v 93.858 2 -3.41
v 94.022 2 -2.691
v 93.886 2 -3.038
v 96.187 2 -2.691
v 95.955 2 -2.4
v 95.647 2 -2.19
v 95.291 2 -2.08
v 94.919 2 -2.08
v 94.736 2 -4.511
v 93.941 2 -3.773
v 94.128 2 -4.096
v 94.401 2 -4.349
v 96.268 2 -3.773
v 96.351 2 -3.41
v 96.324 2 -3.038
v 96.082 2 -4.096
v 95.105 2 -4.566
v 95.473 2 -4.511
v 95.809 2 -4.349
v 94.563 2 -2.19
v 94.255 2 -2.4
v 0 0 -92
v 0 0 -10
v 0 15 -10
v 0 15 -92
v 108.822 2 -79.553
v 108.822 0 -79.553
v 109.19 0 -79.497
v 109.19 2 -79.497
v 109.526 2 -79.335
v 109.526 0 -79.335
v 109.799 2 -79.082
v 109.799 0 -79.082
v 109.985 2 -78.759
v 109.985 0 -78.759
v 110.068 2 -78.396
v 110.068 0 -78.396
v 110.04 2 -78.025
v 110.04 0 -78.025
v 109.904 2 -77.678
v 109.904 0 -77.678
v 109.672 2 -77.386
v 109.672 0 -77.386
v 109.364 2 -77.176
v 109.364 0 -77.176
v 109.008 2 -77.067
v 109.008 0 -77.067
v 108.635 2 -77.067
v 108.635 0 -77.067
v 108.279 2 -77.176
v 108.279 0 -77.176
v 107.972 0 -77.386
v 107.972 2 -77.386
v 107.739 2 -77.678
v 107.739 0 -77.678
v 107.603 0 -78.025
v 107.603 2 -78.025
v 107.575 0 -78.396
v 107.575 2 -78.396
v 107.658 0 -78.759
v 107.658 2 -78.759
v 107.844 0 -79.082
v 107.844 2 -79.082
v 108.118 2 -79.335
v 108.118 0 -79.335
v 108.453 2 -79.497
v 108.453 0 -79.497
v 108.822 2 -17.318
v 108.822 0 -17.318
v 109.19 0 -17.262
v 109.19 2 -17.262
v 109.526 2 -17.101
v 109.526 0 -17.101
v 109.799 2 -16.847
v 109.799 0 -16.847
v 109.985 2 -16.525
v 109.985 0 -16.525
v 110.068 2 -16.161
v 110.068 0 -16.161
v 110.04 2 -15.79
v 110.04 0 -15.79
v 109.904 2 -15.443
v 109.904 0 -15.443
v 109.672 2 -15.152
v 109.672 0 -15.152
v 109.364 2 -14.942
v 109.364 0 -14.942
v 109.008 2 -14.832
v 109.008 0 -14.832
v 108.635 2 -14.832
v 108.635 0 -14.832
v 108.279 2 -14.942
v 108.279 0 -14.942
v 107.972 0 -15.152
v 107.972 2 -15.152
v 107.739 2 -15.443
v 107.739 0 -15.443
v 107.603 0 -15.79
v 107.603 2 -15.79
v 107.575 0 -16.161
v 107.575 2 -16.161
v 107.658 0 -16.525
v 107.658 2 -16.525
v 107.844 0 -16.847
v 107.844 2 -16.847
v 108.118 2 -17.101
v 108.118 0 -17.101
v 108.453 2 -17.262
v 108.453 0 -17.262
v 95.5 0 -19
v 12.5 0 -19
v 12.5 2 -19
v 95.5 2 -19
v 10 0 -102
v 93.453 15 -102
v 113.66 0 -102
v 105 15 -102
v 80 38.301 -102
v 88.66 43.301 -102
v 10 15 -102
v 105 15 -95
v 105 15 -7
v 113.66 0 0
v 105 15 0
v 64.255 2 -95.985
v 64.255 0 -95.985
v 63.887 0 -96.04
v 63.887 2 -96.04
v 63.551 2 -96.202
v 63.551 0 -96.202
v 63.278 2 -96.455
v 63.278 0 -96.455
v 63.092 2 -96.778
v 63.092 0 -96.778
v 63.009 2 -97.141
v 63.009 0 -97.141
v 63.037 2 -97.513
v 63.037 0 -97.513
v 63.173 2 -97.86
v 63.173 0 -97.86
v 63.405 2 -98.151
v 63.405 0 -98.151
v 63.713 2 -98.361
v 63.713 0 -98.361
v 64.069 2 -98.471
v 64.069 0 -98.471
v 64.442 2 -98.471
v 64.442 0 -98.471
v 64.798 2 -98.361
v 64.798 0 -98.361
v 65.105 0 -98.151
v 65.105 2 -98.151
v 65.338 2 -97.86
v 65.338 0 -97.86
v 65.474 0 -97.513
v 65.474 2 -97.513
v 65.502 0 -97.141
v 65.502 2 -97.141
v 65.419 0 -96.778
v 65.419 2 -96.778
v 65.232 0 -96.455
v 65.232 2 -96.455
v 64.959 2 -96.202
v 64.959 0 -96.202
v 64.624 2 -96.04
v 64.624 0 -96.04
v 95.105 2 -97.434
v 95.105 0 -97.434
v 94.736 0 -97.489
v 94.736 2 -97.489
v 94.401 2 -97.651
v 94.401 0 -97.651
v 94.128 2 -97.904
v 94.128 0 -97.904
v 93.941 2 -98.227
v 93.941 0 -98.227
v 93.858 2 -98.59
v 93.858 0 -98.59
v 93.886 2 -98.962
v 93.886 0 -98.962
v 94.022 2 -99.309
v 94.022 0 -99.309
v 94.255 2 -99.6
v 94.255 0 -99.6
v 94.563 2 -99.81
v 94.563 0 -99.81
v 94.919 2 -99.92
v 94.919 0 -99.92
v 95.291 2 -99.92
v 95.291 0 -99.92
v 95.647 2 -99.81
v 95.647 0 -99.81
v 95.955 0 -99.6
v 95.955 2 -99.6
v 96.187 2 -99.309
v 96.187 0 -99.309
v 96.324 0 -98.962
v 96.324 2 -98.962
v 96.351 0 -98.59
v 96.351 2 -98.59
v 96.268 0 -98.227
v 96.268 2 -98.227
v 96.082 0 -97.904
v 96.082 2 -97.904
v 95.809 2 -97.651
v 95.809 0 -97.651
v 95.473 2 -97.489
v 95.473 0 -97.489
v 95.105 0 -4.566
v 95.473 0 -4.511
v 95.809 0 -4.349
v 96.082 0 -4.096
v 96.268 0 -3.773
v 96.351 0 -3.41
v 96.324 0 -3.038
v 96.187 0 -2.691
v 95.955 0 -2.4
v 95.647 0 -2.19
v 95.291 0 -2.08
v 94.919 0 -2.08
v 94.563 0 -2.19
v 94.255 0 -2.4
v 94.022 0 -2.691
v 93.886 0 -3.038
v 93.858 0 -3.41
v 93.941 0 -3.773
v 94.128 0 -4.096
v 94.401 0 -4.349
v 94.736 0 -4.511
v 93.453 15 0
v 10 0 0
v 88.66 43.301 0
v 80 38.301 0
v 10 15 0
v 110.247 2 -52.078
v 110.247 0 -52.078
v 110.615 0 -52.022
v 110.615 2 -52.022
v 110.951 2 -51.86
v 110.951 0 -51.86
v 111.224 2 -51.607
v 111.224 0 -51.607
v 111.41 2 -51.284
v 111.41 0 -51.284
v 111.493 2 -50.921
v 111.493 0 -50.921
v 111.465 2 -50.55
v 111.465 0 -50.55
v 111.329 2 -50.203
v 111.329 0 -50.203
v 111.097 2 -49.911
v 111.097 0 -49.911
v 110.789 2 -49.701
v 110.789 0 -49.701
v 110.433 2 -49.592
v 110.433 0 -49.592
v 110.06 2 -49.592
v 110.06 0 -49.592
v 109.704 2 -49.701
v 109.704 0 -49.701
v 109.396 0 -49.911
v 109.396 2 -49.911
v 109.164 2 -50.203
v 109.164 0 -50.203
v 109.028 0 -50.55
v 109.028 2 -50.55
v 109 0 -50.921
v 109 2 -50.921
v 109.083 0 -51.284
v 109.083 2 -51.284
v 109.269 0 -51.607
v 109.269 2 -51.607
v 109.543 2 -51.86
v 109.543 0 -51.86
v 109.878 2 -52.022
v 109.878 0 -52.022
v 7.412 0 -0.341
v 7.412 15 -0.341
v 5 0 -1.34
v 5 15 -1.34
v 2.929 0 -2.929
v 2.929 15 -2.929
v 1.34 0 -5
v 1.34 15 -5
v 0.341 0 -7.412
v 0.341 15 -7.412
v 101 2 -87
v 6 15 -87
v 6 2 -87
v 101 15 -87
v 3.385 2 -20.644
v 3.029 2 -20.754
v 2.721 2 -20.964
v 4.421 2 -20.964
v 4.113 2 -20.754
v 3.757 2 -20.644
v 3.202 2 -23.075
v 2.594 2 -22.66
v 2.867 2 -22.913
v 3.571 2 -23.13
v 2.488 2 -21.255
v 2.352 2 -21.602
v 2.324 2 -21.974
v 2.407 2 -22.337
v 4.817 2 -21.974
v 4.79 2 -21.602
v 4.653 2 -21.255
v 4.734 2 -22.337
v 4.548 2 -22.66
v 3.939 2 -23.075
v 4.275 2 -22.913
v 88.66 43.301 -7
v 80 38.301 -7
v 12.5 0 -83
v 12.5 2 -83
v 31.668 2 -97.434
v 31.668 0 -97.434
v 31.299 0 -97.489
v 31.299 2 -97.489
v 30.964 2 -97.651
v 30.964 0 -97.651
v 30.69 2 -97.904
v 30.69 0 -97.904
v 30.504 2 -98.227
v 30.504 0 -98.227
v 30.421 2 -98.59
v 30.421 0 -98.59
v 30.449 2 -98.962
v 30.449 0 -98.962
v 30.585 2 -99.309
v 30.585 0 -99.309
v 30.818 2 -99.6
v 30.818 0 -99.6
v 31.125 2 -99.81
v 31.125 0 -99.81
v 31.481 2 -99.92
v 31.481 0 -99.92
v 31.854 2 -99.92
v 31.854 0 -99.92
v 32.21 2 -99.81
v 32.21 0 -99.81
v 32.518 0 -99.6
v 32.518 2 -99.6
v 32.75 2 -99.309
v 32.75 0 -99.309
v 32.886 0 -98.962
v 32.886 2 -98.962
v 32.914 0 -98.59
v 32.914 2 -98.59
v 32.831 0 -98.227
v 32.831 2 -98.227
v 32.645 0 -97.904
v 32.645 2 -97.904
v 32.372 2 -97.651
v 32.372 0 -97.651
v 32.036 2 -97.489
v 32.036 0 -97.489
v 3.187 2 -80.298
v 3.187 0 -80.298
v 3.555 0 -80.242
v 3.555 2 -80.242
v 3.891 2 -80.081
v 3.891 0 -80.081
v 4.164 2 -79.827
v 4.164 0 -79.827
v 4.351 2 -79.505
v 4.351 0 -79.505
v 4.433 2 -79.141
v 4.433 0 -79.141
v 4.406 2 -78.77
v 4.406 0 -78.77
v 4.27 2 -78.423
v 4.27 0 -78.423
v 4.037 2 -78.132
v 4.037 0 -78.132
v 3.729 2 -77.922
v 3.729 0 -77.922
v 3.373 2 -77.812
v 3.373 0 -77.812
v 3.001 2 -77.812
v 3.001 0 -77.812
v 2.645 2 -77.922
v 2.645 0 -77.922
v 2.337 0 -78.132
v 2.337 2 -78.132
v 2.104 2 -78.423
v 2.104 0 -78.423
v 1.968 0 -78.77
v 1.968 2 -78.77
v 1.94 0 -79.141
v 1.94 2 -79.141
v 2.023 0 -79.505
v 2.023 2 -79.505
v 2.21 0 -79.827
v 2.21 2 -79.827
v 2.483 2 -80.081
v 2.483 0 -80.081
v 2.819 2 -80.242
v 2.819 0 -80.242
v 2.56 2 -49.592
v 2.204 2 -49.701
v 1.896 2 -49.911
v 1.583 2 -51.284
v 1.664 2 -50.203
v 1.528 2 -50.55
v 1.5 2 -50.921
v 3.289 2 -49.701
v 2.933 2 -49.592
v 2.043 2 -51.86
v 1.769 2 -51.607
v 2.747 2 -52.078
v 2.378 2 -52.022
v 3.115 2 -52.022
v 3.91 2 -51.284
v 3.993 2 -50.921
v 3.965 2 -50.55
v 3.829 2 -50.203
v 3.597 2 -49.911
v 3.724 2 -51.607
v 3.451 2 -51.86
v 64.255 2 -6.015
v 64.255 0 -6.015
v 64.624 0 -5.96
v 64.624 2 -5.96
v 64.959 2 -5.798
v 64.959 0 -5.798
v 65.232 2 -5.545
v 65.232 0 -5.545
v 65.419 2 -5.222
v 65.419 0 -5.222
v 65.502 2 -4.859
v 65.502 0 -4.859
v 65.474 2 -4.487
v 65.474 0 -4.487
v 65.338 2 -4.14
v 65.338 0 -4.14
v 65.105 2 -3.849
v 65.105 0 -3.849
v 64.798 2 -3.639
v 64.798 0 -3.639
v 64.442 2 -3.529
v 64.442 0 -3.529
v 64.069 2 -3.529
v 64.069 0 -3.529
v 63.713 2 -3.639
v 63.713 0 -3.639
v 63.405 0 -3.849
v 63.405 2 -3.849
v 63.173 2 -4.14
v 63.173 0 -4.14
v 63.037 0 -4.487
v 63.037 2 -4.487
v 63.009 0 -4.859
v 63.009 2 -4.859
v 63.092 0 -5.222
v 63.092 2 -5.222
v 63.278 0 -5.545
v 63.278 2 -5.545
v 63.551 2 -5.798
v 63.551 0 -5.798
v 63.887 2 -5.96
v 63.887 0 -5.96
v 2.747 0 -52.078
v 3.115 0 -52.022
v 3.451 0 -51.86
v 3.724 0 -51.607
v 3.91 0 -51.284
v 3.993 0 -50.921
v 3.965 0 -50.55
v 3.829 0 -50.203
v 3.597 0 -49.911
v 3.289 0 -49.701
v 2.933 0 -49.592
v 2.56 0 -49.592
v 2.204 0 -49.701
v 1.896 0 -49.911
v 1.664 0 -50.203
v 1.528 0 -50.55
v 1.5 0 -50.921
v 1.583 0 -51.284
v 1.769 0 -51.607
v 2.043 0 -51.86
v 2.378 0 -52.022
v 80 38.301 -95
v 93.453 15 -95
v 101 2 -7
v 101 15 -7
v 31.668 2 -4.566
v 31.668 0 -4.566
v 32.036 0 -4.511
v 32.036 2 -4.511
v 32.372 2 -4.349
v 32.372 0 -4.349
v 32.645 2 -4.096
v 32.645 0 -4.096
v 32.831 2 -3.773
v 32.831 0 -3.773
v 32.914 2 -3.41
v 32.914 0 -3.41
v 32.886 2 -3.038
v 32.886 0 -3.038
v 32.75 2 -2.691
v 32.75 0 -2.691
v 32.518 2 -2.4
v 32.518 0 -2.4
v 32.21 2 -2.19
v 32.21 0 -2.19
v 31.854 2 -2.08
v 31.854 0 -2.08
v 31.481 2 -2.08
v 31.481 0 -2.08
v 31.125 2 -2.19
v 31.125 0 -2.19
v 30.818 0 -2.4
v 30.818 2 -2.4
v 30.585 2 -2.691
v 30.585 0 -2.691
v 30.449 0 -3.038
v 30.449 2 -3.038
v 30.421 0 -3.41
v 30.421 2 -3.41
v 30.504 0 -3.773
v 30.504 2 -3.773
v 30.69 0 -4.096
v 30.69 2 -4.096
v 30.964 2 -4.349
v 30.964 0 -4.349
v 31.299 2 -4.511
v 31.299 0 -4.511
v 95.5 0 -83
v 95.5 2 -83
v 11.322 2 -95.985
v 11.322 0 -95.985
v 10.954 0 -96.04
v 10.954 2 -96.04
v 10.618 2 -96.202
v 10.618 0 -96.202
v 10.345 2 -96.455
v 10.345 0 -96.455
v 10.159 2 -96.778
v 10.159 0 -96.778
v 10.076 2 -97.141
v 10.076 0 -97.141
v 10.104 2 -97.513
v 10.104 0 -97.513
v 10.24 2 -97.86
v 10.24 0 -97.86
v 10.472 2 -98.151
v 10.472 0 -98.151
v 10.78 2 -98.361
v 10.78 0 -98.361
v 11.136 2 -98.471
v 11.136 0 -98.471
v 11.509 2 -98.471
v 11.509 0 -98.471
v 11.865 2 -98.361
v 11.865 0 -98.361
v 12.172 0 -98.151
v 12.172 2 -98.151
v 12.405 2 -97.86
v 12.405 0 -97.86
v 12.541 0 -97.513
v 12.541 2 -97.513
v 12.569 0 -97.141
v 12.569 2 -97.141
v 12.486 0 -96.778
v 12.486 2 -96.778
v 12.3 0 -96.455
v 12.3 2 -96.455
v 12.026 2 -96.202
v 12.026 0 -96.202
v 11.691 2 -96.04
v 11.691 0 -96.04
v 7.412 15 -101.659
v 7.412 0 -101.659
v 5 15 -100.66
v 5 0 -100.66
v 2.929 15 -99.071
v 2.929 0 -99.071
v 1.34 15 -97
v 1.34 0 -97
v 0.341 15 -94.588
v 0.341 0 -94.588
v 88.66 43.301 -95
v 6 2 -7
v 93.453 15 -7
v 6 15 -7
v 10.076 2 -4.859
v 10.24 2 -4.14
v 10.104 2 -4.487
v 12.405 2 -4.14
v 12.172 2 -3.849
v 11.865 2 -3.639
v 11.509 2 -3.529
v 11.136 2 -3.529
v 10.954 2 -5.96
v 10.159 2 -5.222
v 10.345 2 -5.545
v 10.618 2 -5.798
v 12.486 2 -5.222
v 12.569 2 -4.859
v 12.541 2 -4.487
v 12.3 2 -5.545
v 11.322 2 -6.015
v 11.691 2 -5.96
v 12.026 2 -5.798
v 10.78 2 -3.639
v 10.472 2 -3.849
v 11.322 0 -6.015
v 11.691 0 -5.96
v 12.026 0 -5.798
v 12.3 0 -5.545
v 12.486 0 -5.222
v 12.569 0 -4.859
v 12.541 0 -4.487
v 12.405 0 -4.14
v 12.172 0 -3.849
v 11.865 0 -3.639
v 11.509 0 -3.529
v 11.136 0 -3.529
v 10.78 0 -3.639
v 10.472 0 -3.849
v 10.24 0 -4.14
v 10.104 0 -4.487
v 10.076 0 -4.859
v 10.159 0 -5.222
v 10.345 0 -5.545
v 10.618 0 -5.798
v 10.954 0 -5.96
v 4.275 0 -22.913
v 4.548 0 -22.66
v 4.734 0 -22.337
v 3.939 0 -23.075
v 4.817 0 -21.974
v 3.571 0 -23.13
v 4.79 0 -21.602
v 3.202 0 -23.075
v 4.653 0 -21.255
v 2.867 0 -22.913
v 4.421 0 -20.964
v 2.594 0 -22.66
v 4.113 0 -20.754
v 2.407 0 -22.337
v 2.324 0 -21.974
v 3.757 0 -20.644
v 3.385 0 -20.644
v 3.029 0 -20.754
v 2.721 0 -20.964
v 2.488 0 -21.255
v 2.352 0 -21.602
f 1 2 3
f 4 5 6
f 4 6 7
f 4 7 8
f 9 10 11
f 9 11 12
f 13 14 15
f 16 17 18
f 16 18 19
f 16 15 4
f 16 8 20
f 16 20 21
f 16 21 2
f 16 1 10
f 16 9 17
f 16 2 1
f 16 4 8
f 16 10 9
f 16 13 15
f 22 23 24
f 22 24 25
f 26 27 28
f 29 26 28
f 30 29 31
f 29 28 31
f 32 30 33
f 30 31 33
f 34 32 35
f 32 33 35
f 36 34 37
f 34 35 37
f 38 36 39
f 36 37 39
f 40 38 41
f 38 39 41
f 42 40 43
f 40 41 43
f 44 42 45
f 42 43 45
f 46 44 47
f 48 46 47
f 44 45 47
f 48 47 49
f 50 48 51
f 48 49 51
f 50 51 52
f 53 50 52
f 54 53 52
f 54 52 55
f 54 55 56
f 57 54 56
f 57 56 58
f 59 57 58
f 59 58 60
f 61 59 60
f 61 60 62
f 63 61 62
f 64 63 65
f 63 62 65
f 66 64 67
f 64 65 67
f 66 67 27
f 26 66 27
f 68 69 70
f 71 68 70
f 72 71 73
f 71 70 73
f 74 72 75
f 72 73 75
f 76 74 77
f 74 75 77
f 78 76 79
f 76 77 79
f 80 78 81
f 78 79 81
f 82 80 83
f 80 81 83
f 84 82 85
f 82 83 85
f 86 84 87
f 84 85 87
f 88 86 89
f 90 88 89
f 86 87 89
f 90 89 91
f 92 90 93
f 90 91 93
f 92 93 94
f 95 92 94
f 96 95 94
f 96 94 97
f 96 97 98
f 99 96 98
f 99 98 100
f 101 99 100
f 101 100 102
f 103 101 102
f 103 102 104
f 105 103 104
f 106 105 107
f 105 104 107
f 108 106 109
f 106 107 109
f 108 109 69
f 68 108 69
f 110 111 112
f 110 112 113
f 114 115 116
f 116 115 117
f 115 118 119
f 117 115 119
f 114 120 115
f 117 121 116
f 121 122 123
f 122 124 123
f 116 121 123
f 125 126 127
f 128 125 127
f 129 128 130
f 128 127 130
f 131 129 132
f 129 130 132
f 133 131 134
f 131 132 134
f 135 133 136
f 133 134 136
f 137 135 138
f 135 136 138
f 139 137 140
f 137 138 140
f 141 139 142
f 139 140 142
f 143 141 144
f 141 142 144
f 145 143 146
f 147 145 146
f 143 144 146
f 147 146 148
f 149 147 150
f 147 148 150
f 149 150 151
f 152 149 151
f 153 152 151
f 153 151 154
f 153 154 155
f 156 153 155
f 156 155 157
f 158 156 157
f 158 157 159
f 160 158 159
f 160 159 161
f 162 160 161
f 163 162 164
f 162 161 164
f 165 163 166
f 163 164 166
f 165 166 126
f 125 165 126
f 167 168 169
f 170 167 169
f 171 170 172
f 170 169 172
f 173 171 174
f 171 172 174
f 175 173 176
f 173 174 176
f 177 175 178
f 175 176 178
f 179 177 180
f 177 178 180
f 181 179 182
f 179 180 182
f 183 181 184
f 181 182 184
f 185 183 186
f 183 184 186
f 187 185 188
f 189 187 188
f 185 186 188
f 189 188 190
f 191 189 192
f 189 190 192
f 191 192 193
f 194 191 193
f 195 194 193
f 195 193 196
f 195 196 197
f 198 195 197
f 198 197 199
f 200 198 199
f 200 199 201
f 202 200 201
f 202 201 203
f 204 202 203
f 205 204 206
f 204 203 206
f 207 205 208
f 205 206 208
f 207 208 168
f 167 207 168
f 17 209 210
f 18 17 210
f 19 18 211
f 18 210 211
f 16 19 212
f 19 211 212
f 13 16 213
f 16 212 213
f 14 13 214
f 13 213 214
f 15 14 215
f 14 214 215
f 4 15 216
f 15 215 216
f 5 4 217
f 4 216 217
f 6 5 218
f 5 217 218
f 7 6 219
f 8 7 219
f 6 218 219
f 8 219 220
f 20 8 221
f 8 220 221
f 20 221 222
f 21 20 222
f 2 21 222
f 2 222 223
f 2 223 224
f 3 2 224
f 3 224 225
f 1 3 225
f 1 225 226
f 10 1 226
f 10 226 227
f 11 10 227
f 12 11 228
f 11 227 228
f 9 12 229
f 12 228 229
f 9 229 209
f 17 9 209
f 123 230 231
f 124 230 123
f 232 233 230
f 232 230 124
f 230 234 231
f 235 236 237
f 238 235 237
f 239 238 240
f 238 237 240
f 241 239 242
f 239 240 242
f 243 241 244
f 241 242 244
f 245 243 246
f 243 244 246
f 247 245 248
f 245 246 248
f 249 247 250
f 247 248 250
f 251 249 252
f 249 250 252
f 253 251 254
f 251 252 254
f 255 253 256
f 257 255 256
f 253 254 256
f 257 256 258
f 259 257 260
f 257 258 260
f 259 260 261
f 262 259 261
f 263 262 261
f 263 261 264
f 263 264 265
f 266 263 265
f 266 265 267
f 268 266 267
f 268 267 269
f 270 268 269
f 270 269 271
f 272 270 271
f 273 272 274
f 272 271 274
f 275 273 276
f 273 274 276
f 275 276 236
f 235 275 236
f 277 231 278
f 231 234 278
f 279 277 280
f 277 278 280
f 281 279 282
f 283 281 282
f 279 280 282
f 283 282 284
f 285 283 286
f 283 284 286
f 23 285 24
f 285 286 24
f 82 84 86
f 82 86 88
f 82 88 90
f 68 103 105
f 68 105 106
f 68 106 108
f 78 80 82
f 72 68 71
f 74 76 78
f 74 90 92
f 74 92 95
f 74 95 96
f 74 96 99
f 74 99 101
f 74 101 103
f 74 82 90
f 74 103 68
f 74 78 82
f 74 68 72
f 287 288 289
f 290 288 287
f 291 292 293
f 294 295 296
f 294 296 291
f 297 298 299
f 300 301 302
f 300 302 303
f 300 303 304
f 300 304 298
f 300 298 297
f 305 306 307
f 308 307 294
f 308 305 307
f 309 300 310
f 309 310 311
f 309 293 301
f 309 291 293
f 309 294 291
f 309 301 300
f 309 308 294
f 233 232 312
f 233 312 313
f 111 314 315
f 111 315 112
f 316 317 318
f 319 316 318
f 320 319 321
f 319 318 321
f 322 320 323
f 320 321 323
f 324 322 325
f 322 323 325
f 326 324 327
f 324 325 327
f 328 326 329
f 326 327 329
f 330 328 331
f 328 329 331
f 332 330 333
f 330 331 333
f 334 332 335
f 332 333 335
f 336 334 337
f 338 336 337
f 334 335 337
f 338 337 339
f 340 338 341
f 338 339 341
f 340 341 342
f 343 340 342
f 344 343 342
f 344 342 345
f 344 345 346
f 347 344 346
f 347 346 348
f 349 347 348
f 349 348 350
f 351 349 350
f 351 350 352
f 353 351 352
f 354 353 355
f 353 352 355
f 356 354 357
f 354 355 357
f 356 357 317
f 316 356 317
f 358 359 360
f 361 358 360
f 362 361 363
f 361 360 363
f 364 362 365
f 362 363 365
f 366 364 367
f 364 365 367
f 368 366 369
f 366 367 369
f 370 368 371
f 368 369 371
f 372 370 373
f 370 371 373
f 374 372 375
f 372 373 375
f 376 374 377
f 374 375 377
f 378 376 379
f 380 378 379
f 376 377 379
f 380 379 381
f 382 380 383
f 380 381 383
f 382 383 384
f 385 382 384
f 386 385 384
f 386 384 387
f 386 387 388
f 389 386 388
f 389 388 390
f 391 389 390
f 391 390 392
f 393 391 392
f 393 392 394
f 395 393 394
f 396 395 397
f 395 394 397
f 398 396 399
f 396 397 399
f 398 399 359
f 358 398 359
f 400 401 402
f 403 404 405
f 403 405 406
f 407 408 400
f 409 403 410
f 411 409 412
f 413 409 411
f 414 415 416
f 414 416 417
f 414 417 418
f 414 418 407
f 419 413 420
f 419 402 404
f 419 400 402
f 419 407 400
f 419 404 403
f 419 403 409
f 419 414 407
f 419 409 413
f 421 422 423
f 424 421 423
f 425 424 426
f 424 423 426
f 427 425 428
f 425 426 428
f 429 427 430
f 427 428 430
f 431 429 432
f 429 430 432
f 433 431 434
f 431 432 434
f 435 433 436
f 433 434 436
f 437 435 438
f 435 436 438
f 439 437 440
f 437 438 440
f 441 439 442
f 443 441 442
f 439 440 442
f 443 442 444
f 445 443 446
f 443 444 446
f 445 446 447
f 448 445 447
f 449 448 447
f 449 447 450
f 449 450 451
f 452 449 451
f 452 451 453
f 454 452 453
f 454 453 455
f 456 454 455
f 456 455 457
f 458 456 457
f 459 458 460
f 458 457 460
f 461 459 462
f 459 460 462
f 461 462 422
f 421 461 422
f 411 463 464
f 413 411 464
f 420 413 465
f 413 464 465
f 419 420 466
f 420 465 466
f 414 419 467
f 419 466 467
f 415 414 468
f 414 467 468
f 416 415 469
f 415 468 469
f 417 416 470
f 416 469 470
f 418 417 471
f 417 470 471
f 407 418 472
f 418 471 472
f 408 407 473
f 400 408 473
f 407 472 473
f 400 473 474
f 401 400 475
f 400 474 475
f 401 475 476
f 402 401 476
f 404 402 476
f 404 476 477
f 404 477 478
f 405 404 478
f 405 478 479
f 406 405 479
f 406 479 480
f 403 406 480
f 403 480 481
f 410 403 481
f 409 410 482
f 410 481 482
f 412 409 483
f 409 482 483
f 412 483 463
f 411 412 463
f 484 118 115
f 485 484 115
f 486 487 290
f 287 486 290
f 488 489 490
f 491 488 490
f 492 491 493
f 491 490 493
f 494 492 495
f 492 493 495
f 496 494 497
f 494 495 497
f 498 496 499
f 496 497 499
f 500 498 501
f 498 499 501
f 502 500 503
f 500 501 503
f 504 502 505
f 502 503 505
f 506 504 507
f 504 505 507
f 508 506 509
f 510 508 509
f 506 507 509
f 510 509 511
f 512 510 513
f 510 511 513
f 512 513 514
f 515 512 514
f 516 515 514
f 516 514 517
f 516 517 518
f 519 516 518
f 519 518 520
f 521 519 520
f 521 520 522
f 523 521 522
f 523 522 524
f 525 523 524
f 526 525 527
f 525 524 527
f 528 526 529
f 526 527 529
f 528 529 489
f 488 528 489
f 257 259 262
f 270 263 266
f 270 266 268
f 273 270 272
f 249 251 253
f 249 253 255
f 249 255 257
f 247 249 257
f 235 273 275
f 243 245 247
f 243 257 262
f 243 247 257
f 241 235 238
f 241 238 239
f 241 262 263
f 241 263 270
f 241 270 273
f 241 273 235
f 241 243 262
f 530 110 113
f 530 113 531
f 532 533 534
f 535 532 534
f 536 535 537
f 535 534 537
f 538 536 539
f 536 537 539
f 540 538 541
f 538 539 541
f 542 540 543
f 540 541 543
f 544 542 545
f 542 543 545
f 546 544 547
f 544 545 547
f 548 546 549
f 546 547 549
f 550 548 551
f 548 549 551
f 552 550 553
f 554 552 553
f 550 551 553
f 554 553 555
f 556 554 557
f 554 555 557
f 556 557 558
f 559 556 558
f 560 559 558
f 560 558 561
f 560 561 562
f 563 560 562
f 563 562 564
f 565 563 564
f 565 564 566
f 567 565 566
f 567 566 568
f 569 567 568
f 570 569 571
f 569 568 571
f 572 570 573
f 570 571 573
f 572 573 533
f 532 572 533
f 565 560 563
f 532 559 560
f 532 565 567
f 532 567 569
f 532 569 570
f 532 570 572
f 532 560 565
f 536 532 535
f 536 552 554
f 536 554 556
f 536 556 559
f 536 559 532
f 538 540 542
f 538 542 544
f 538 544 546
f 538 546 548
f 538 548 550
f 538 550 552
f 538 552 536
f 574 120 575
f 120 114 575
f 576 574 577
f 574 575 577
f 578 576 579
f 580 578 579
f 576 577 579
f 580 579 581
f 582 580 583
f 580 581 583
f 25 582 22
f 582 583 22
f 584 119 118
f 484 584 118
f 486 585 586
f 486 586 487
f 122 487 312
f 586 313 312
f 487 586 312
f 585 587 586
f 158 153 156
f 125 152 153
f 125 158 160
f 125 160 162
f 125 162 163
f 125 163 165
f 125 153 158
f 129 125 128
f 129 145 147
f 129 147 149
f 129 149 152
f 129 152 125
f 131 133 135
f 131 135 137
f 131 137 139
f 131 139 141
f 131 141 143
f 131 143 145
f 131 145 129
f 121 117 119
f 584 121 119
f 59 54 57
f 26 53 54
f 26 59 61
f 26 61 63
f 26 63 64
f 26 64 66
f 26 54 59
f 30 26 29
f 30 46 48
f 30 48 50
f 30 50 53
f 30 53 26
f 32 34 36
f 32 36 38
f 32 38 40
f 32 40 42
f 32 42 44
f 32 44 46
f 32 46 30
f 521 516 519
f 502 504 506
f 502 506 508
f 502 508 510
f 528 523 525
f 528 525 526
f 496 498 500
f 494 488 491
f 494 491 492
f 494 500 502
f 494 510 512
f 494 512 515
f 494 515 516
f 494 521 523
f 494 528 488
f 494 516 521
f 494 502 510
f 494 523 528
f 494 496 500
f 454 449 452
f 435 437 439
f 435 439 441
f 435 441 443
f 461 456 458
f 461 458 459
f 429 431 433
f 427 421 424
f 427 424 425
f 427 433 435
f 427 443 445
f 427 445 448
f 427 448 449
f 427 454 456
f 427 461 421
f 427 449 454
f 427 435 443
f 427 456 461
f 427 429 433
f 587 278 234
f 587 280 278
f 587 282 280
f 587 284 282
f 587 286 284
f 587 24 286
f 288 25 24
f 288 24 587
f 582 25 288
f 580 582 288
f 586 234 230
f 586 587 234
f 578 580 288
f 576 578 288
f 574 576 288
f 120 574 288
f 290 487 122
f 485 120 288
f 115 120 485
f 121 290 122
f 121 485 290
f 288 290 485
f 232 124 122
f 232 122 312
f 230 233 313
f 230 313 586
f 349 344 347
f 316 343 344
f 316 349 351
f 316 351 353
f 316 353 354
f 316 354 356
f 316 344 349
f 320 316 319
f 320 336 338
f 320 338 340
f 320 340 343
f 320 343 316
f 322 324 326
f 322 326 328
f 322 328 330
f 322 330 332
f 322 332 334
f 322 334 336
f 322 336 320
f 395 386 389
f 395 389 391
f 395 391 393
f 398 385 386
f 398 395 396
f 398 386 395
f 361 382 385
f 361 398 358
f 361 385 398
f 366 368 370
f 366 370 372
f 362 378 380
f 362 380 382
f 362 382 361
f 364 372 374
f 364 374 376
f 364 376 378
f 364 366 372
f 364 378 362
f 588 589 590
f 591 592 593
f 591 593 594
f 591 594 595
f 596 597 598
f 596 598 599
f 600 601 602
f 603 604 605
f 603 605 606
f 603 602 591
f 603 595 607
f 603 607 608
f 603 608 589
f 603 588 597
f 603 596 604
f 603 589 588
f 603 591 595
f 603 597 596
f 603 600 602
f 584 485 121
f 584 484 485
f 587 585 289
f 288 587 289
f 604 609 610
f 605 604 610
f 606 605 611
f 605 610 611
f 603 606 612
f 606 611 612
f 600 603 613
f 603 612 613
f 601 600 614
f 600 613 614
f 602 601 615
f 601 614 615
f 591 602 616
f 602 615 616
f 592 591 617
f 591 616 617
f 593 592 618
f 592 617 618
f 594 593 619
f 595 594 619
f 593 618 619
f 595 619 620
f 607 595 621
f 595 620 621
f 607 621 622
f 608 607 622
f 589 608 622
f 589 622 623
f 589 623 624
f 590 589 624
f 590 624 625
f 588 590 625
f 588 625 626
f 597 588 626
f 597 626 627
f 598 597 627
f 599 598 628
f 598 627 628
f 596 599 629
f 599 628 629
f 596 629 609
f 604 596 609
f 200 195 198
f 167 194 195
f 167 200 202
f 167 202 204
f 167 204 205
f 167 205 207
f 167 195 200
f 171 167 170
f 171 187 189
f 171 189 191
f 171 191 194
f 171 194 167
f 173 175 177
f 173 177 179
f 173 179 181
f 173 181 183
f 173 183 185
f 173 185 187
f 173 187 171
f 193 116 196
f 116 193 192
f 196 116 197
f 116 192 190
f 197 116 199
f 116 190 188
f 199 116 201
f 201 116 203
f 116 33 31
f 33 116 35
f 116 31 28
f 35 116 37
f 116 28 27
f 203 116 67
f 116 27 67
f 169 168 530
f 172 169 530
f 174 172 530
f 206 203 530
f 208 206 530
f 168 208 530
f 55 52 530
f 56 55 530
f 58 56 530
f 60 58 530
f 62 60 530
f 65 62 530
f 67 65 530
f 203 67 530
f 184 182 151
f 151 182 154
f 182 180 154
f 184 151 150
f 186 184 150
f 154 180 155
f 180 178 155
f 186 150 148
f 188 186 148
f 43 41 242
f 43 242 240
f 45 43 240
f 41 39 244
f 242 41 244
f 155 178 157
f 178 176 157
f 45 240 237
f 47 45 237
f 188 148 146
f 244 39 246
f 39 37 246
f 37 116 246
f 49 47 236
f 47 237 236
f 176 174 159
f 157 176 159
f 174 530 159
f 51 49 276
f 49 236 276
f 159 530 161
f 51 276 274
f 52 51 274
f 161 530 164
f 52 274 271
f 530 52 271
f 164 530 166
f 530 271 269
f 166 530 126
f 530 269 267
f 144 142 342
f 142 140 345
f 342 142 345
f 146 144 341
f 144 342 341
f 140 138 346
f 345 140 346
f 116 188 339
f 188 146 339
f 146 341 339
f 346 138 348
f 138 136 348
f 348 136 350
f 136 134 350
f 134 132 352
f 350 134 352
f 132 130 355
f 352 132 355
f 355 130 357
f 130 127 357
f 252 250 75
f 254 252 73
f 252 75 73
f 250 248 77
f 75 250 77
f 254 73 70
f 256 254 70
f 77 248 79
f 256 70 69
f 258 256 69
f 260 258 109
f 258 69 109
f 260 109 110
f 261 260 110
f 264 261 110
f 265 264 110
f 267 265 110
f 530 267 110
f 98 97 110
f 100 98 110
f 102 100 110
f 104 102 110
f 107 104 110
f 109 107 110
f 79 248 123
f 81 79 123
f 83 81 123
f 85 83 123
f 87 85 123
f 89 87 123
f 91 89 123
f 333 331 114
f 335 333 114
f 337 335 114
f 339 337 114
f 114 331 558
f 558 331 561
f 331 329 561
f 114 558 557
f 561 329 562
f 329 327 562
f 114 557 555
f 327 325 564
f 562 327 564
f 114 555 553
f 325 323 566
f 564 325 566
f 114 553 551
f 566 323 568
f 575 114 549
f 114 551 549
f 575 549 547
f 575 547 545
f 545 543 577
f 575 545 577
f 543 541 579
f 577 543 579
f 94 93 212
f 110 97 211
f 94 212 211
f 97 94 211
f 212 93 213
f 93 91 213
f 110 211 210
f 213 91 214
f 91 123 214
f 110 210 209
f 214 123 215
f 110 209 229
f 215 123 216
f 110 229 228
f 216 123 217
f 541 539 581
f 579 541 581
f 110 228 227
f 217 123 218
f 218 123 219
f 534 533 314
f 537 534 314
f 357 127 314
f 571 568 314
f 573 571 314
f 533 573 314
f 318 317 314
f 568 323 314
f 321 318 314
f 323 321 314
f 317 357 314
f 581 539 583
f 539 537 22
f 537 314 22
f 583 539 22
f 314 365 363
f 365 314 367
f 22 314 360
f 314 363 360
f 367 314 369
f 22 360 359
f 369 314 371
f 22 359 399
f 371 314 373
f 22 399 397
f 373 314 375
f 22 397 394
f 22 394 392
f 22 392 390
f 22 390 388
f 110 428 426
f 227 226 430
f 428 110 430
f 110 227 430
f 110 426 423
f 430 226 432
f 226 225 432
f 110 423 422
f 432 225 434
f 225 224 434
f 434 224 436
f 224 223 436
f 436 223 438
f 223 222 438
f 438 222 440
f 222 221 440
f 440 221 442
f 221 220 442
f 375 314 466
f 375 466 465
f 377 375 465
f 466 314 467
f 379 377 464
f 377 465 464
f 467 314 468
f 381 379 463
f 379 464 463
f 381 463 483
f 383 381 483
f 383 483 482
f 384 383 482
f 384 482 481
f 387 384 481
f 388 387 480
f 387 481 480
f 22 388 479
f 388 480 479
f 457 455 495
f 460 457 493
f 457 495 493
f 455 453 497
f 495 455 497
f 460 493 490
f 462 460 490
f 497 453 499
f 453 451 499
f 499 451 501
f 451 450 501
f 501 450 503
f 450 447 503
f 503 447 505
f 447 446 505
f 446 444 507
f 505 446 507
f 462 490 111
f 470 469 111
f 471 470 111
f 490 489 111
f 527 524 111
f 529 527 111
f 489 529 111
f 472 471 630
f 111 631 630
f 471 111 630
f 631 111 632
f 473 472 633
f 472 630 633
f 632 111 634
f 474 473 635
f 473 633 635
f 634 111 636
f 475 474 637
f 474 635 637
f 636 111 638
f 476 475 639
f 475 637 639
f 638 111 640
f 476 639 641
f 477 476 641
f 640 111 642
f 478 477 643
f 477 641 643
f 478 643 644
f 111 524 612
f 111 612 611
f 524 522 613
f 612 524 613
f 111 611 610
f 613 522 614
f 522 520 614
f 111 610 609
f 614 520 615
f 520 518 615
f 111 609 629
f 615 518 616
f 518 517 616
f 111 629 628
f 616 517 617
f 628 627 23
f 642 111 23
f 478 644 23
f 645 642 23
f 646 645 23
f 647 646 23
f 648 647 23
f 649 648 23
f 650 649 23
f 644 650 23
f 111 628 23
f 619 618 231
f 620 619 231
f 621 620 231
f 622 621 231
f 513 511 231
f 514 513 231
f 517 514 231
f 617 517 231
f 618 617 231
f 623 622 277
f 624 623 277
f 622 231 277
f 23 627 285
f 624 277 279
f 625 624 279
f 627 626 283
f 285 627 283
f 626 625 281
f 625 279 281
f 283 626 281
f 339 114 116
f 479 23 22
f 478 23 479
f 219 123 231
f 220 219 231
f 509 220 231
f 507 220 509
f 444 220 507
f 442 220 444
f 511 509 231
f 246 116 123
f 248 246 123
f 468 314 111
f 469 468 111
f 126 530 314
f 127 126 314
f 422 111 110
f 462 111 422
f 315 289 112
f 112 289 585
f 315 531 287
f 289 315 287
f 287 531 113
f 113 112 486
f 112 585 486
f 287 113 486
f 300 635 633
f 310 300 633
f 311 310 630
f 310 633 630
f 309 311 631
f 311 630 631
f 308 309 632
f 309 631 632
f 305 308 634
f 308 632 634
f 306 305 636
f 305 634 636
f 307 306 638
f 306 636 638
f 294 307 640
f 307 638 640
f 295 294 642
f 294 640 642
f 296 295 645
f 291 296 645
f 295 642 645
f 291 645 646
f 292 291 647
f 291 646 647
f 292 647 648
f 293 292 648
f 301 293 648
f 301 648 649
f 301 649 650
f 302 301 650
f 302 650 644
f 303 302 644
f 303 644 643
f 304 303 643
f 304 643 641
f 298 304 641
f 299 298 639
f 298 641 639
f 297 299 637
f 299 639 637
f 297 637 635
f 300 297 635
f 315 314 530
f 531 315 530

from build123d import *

# Parameters (mm, degrees)
SKIZZE6_W                        = 105
SKIZZE6_H                        = 90
AUFSATZ_LINEAR_AUSTRAGEN3_DEPTH  = 15
SKIZZE7_W                        = 98
SKIZZE7_H                        = 83
SCHNITT_LINEAR_AUSTRAGEN1_DEPTH  = 13
SKIZZE8_W                        = 93
SKIZZE8_H                        = 66
SCHNITT_LINEAR_AUSTRAGEN2_DEPTH  = 13
SKIZZE12_W                       = 83
SKIZZE12_H                       = 1
AUFSATZ_LINEAR_AUSTRAGEN4_DEPTH  = 2
SKIZZE13_W                       = 3
SKIZZE13_H                       = 80
SKIZZE13_H_2                     = 3
SKIZZE13_W_2                     = 95
AUFSATZ_LINEAR_AUSTRAGEN5_DEPTH  = 13
SKIZZE14_W                       = 105
SKIZZE14_H                       = 19
AUFSATZ_LINEAR_AUSTRAGEN7_DEPTH  = 2
SKIZZE15_W                       = 105
SKIZZE15_H                       = 12
AUFSATZ_LINEAR_AUSTRAGEN8_DEPTH  = 13
AUFSATZ_LINEAR_AUSTRAGEN13_DEPTH = 7
AUFSATZ_LINEAR_AUSTRAGEN14_DEPTH = 88
SKIZZE28_R                       = 1.25
SCHNITT_LINEAR_AUSTRAGEN3_DEPTH  = 2
VERRUNDUNG1_R                    = 10


with BuildPart() as part:
    # Skizze6 → Aufsatz-Linear austragen3 (new body)
    with BuildSketch(Plane(origin=(0, 0, 0), x_dir=(1, 0, 0), z_dir=(0, 1, 0))):
        with Locations((52.5, 45)):
            Rectangle(SKIZZE6_W, SKIZZE6_H)
    extrude(amount=AUFSATZ_LINEAR_AUSTRAGEN3_DEPTH)

    # Skizze7 → Schnitt-Linear austragen1 (cut)
    with BuildSketch(Plane(origin=(0, 15, 0), x_dir=(1, 0, 0), z_dir=(0, 1, 0))):
        with Locations((52, 45.5)):
            Rectangle(SKIZZE7_W, SKIZZE7_H)
    extrude(amount=-SCHNITT_LINEAR_AUSTRAGEN1_DEPTH, mode=Mode.SUBTRACT)

    # Skizze8 → Schnitt-Linear austragen2 (cut)
    with BuildSketch(Plane(origin=(0, 2, 0), x_dir=(1, 0, 0), z_dir=(0, 1, 0))):
        with Locations((52, 51)):
            Rectangle(SKIZZE8_W, SKIZZE8_H)
    extrude(amount=-SCHNITT_LINEAR_AUSTRAGEN2_DEPTH, mode=Mode.SUBTRACT)

    # Skizze12 → Aufsatz-Linear austragen4 (add)
    with BuildSketch(Plane.XZ):
        Polygon((5.5, -18), (5.5, -84), (12.5, -84), (12.5, -83), (12.5, -19), (12.5, -18), align=None)
        Polygon((95.5, -83), (95.5, -84), (98.5, -84), (98.5, -18), (95.5, -18), (95.5, -19), align=None)
        with Locations((54, -83.5)):
            Rectangle(SKIZZE12_W, SKIZZE12_H)
        with Locations((54, -18.5)):
            Rectangle(SKIZZE12_W, SKIZZE12_H)
    extrude(amount=-AUFSATZ_LINEAR_AUSTRAGEN4_DEPTH)

    # Skizze13 → Aufsatz-Linear austragen5 (add)
    with BuildSketch(Plane(origin=(0, 2, 0), x_dir=(1, 0, 0), z_dir=(0, 1, 0))):
        with Locations((4.5, 47)):
            Rectangle(SKIZZE13_W, SKIZZE13_H)
        with Locations((4.5, 5.5)):
            Rectangle(SKIZZE13_W, SKIZZE13_H_2)
        with Locations((53.5, 5.5)):
            Rectangle(SKIZZE13_W_2, SKIZZE13_H_2)
    extrude(amount=AUFSATZ_LINEAR_AUSTRAGEN5_DEPTH)

    # Skizze14 → Aufsatz-Linear austragen7 (add)
    with BuildSketch(Plane.XZ):
        with Locations((52.5, -92.5)):
            Rectangle(SKIZZE14_W, SKIZZE14_H)
    extrude(amount=-AUFSATZ_LINEAR_AUSTRAGEN7_DEPTH)

    # Skizze15 → Aufsatz-Linear austragen8 (add)
    with BuildSketch(Plane(origin=(0, 2, 0), x_dir=(1, 0, 0), z_dir=(0, 1, 0))):
        with Locations((52.5, 96)):
            Rectangle(SKIZZE15_W, SKIZZE15_H)
    extrude(amount=AUFSATZ_LINEAR_AUSTRAGEN8_DEPTH)

    # Skizze21 → Aufsatz-Linear austragen13 (add)
    with BuildSketch(Plane.XY):
        Polygon((113.660254038, 0), (105, 15), (88.660254038, 43.301270189), (80, 38.301270189), (102.113248654, 0), align=None)
    aufsatz_linear_austragen13 = extrude(amount=-AUFSATZ_LINEAR_AUSTRAGEN13_DEPTH)

    # Spiegeln2: Aufsatz-Linear austragen13 across plane
    add(aufsatz_linear_austragen13.mirror(Plane(origin=(0, 0, -51), x_dir=(1, 0, 0), z_dir=(0, 0, -1))))

    # Skizze22 → Aufsatz-Linear austragen14 (add)
    with BuildSketch(Plane(origin=(0, 0, -7), x_dir=(-1, 0, 0), z_dir=(0, 0, -1))):
        Polygon((-113.660254038, 0), (-105, 0), (-105, 15), align=None)
    extrude(amount=AUFSATZ_LINEAR_AUSTRAGEN14_DEPTH)

    # Skizze28 → Schnitt-Linear austragen3 (cut)
    with BuildSketch(Plane.XZ):
        with Locations(Location((11.322239977, -4.765490033, 0), (0, 0, 270))):
            Circle(SKIZZE28_R)
        with Locations(Location((31.667742372, -3.316351302, 0), (0, 0, 270))):
            Circle(SKIZZE28_R)
        with Locations(Location((64.25520832, -4.765490033, 0), (0, 0, 270))):
            Circle(SKIZZE28_R)
        with Locations(Location((95.104906067, -3.316351302, 0), (0, 0, 270))):
            Circle(SKIZZE28_R)
        with Locations(Location((95.104906067, -98.683648698, 0), (0, 0, 90))):
            Circle(SKIZZE28_R)
        with Locations(Location((64.25520832, -97.234509967, 0), (0, 0, 90))):
            Circle(SKIZZE28_R)
        with Locations(Location((31.667742372, -98.683648698, 0), (0, 0, 90))):
            Circle(SKIZZE28_R)
        with Locations(Location((11.322239977, -97.234509967, 0), (0, 0, 90))):
            Circle(SKIZZE28_R)
        with Locations(Location((108.821722726, -16.067904783, 0), (0, 0, 270))):
            Circle(SKIZZE28_R)
        with Locations(Location((108.821722726, -78.302664898, 0), (0, 0, 270))):
            Circle(SKIZZE28_R)
        with Locations(Location((110.246680606, -50.827682844, 0), (0, 0, 270))):
            Circle(SKIZZE28_R)
        with Locations(Location((2.746653242, -50.827682844, 0), (0, 0, 270))):
            Circle(SKIZZE28_R)
        with Locations(Location((3.570883833, -21.880288219, 0), (0, 0, 270))):
            Circle(SKIZZE28_R)
        with Locations(Location((3.186977763, -79.047966594, 0), (0, 0, 270))):
            Circle(SKIZZE28_R)
    extrude(amount=-SCHNITT_LINEAR_AUSTRAGEN3_DEPTH, mode=Mode.SUBTRACT)

    # Verrundung1
    verrundung1_edges = [part.edges().sort_by_distance(p)[0] for p in [
        (0, 7.5, -102),
        (0, 7.5, 0),
    ]]
    fillet(verrundung1_edges, radius=VERRUNDUNG1_R)


solid = part.part
